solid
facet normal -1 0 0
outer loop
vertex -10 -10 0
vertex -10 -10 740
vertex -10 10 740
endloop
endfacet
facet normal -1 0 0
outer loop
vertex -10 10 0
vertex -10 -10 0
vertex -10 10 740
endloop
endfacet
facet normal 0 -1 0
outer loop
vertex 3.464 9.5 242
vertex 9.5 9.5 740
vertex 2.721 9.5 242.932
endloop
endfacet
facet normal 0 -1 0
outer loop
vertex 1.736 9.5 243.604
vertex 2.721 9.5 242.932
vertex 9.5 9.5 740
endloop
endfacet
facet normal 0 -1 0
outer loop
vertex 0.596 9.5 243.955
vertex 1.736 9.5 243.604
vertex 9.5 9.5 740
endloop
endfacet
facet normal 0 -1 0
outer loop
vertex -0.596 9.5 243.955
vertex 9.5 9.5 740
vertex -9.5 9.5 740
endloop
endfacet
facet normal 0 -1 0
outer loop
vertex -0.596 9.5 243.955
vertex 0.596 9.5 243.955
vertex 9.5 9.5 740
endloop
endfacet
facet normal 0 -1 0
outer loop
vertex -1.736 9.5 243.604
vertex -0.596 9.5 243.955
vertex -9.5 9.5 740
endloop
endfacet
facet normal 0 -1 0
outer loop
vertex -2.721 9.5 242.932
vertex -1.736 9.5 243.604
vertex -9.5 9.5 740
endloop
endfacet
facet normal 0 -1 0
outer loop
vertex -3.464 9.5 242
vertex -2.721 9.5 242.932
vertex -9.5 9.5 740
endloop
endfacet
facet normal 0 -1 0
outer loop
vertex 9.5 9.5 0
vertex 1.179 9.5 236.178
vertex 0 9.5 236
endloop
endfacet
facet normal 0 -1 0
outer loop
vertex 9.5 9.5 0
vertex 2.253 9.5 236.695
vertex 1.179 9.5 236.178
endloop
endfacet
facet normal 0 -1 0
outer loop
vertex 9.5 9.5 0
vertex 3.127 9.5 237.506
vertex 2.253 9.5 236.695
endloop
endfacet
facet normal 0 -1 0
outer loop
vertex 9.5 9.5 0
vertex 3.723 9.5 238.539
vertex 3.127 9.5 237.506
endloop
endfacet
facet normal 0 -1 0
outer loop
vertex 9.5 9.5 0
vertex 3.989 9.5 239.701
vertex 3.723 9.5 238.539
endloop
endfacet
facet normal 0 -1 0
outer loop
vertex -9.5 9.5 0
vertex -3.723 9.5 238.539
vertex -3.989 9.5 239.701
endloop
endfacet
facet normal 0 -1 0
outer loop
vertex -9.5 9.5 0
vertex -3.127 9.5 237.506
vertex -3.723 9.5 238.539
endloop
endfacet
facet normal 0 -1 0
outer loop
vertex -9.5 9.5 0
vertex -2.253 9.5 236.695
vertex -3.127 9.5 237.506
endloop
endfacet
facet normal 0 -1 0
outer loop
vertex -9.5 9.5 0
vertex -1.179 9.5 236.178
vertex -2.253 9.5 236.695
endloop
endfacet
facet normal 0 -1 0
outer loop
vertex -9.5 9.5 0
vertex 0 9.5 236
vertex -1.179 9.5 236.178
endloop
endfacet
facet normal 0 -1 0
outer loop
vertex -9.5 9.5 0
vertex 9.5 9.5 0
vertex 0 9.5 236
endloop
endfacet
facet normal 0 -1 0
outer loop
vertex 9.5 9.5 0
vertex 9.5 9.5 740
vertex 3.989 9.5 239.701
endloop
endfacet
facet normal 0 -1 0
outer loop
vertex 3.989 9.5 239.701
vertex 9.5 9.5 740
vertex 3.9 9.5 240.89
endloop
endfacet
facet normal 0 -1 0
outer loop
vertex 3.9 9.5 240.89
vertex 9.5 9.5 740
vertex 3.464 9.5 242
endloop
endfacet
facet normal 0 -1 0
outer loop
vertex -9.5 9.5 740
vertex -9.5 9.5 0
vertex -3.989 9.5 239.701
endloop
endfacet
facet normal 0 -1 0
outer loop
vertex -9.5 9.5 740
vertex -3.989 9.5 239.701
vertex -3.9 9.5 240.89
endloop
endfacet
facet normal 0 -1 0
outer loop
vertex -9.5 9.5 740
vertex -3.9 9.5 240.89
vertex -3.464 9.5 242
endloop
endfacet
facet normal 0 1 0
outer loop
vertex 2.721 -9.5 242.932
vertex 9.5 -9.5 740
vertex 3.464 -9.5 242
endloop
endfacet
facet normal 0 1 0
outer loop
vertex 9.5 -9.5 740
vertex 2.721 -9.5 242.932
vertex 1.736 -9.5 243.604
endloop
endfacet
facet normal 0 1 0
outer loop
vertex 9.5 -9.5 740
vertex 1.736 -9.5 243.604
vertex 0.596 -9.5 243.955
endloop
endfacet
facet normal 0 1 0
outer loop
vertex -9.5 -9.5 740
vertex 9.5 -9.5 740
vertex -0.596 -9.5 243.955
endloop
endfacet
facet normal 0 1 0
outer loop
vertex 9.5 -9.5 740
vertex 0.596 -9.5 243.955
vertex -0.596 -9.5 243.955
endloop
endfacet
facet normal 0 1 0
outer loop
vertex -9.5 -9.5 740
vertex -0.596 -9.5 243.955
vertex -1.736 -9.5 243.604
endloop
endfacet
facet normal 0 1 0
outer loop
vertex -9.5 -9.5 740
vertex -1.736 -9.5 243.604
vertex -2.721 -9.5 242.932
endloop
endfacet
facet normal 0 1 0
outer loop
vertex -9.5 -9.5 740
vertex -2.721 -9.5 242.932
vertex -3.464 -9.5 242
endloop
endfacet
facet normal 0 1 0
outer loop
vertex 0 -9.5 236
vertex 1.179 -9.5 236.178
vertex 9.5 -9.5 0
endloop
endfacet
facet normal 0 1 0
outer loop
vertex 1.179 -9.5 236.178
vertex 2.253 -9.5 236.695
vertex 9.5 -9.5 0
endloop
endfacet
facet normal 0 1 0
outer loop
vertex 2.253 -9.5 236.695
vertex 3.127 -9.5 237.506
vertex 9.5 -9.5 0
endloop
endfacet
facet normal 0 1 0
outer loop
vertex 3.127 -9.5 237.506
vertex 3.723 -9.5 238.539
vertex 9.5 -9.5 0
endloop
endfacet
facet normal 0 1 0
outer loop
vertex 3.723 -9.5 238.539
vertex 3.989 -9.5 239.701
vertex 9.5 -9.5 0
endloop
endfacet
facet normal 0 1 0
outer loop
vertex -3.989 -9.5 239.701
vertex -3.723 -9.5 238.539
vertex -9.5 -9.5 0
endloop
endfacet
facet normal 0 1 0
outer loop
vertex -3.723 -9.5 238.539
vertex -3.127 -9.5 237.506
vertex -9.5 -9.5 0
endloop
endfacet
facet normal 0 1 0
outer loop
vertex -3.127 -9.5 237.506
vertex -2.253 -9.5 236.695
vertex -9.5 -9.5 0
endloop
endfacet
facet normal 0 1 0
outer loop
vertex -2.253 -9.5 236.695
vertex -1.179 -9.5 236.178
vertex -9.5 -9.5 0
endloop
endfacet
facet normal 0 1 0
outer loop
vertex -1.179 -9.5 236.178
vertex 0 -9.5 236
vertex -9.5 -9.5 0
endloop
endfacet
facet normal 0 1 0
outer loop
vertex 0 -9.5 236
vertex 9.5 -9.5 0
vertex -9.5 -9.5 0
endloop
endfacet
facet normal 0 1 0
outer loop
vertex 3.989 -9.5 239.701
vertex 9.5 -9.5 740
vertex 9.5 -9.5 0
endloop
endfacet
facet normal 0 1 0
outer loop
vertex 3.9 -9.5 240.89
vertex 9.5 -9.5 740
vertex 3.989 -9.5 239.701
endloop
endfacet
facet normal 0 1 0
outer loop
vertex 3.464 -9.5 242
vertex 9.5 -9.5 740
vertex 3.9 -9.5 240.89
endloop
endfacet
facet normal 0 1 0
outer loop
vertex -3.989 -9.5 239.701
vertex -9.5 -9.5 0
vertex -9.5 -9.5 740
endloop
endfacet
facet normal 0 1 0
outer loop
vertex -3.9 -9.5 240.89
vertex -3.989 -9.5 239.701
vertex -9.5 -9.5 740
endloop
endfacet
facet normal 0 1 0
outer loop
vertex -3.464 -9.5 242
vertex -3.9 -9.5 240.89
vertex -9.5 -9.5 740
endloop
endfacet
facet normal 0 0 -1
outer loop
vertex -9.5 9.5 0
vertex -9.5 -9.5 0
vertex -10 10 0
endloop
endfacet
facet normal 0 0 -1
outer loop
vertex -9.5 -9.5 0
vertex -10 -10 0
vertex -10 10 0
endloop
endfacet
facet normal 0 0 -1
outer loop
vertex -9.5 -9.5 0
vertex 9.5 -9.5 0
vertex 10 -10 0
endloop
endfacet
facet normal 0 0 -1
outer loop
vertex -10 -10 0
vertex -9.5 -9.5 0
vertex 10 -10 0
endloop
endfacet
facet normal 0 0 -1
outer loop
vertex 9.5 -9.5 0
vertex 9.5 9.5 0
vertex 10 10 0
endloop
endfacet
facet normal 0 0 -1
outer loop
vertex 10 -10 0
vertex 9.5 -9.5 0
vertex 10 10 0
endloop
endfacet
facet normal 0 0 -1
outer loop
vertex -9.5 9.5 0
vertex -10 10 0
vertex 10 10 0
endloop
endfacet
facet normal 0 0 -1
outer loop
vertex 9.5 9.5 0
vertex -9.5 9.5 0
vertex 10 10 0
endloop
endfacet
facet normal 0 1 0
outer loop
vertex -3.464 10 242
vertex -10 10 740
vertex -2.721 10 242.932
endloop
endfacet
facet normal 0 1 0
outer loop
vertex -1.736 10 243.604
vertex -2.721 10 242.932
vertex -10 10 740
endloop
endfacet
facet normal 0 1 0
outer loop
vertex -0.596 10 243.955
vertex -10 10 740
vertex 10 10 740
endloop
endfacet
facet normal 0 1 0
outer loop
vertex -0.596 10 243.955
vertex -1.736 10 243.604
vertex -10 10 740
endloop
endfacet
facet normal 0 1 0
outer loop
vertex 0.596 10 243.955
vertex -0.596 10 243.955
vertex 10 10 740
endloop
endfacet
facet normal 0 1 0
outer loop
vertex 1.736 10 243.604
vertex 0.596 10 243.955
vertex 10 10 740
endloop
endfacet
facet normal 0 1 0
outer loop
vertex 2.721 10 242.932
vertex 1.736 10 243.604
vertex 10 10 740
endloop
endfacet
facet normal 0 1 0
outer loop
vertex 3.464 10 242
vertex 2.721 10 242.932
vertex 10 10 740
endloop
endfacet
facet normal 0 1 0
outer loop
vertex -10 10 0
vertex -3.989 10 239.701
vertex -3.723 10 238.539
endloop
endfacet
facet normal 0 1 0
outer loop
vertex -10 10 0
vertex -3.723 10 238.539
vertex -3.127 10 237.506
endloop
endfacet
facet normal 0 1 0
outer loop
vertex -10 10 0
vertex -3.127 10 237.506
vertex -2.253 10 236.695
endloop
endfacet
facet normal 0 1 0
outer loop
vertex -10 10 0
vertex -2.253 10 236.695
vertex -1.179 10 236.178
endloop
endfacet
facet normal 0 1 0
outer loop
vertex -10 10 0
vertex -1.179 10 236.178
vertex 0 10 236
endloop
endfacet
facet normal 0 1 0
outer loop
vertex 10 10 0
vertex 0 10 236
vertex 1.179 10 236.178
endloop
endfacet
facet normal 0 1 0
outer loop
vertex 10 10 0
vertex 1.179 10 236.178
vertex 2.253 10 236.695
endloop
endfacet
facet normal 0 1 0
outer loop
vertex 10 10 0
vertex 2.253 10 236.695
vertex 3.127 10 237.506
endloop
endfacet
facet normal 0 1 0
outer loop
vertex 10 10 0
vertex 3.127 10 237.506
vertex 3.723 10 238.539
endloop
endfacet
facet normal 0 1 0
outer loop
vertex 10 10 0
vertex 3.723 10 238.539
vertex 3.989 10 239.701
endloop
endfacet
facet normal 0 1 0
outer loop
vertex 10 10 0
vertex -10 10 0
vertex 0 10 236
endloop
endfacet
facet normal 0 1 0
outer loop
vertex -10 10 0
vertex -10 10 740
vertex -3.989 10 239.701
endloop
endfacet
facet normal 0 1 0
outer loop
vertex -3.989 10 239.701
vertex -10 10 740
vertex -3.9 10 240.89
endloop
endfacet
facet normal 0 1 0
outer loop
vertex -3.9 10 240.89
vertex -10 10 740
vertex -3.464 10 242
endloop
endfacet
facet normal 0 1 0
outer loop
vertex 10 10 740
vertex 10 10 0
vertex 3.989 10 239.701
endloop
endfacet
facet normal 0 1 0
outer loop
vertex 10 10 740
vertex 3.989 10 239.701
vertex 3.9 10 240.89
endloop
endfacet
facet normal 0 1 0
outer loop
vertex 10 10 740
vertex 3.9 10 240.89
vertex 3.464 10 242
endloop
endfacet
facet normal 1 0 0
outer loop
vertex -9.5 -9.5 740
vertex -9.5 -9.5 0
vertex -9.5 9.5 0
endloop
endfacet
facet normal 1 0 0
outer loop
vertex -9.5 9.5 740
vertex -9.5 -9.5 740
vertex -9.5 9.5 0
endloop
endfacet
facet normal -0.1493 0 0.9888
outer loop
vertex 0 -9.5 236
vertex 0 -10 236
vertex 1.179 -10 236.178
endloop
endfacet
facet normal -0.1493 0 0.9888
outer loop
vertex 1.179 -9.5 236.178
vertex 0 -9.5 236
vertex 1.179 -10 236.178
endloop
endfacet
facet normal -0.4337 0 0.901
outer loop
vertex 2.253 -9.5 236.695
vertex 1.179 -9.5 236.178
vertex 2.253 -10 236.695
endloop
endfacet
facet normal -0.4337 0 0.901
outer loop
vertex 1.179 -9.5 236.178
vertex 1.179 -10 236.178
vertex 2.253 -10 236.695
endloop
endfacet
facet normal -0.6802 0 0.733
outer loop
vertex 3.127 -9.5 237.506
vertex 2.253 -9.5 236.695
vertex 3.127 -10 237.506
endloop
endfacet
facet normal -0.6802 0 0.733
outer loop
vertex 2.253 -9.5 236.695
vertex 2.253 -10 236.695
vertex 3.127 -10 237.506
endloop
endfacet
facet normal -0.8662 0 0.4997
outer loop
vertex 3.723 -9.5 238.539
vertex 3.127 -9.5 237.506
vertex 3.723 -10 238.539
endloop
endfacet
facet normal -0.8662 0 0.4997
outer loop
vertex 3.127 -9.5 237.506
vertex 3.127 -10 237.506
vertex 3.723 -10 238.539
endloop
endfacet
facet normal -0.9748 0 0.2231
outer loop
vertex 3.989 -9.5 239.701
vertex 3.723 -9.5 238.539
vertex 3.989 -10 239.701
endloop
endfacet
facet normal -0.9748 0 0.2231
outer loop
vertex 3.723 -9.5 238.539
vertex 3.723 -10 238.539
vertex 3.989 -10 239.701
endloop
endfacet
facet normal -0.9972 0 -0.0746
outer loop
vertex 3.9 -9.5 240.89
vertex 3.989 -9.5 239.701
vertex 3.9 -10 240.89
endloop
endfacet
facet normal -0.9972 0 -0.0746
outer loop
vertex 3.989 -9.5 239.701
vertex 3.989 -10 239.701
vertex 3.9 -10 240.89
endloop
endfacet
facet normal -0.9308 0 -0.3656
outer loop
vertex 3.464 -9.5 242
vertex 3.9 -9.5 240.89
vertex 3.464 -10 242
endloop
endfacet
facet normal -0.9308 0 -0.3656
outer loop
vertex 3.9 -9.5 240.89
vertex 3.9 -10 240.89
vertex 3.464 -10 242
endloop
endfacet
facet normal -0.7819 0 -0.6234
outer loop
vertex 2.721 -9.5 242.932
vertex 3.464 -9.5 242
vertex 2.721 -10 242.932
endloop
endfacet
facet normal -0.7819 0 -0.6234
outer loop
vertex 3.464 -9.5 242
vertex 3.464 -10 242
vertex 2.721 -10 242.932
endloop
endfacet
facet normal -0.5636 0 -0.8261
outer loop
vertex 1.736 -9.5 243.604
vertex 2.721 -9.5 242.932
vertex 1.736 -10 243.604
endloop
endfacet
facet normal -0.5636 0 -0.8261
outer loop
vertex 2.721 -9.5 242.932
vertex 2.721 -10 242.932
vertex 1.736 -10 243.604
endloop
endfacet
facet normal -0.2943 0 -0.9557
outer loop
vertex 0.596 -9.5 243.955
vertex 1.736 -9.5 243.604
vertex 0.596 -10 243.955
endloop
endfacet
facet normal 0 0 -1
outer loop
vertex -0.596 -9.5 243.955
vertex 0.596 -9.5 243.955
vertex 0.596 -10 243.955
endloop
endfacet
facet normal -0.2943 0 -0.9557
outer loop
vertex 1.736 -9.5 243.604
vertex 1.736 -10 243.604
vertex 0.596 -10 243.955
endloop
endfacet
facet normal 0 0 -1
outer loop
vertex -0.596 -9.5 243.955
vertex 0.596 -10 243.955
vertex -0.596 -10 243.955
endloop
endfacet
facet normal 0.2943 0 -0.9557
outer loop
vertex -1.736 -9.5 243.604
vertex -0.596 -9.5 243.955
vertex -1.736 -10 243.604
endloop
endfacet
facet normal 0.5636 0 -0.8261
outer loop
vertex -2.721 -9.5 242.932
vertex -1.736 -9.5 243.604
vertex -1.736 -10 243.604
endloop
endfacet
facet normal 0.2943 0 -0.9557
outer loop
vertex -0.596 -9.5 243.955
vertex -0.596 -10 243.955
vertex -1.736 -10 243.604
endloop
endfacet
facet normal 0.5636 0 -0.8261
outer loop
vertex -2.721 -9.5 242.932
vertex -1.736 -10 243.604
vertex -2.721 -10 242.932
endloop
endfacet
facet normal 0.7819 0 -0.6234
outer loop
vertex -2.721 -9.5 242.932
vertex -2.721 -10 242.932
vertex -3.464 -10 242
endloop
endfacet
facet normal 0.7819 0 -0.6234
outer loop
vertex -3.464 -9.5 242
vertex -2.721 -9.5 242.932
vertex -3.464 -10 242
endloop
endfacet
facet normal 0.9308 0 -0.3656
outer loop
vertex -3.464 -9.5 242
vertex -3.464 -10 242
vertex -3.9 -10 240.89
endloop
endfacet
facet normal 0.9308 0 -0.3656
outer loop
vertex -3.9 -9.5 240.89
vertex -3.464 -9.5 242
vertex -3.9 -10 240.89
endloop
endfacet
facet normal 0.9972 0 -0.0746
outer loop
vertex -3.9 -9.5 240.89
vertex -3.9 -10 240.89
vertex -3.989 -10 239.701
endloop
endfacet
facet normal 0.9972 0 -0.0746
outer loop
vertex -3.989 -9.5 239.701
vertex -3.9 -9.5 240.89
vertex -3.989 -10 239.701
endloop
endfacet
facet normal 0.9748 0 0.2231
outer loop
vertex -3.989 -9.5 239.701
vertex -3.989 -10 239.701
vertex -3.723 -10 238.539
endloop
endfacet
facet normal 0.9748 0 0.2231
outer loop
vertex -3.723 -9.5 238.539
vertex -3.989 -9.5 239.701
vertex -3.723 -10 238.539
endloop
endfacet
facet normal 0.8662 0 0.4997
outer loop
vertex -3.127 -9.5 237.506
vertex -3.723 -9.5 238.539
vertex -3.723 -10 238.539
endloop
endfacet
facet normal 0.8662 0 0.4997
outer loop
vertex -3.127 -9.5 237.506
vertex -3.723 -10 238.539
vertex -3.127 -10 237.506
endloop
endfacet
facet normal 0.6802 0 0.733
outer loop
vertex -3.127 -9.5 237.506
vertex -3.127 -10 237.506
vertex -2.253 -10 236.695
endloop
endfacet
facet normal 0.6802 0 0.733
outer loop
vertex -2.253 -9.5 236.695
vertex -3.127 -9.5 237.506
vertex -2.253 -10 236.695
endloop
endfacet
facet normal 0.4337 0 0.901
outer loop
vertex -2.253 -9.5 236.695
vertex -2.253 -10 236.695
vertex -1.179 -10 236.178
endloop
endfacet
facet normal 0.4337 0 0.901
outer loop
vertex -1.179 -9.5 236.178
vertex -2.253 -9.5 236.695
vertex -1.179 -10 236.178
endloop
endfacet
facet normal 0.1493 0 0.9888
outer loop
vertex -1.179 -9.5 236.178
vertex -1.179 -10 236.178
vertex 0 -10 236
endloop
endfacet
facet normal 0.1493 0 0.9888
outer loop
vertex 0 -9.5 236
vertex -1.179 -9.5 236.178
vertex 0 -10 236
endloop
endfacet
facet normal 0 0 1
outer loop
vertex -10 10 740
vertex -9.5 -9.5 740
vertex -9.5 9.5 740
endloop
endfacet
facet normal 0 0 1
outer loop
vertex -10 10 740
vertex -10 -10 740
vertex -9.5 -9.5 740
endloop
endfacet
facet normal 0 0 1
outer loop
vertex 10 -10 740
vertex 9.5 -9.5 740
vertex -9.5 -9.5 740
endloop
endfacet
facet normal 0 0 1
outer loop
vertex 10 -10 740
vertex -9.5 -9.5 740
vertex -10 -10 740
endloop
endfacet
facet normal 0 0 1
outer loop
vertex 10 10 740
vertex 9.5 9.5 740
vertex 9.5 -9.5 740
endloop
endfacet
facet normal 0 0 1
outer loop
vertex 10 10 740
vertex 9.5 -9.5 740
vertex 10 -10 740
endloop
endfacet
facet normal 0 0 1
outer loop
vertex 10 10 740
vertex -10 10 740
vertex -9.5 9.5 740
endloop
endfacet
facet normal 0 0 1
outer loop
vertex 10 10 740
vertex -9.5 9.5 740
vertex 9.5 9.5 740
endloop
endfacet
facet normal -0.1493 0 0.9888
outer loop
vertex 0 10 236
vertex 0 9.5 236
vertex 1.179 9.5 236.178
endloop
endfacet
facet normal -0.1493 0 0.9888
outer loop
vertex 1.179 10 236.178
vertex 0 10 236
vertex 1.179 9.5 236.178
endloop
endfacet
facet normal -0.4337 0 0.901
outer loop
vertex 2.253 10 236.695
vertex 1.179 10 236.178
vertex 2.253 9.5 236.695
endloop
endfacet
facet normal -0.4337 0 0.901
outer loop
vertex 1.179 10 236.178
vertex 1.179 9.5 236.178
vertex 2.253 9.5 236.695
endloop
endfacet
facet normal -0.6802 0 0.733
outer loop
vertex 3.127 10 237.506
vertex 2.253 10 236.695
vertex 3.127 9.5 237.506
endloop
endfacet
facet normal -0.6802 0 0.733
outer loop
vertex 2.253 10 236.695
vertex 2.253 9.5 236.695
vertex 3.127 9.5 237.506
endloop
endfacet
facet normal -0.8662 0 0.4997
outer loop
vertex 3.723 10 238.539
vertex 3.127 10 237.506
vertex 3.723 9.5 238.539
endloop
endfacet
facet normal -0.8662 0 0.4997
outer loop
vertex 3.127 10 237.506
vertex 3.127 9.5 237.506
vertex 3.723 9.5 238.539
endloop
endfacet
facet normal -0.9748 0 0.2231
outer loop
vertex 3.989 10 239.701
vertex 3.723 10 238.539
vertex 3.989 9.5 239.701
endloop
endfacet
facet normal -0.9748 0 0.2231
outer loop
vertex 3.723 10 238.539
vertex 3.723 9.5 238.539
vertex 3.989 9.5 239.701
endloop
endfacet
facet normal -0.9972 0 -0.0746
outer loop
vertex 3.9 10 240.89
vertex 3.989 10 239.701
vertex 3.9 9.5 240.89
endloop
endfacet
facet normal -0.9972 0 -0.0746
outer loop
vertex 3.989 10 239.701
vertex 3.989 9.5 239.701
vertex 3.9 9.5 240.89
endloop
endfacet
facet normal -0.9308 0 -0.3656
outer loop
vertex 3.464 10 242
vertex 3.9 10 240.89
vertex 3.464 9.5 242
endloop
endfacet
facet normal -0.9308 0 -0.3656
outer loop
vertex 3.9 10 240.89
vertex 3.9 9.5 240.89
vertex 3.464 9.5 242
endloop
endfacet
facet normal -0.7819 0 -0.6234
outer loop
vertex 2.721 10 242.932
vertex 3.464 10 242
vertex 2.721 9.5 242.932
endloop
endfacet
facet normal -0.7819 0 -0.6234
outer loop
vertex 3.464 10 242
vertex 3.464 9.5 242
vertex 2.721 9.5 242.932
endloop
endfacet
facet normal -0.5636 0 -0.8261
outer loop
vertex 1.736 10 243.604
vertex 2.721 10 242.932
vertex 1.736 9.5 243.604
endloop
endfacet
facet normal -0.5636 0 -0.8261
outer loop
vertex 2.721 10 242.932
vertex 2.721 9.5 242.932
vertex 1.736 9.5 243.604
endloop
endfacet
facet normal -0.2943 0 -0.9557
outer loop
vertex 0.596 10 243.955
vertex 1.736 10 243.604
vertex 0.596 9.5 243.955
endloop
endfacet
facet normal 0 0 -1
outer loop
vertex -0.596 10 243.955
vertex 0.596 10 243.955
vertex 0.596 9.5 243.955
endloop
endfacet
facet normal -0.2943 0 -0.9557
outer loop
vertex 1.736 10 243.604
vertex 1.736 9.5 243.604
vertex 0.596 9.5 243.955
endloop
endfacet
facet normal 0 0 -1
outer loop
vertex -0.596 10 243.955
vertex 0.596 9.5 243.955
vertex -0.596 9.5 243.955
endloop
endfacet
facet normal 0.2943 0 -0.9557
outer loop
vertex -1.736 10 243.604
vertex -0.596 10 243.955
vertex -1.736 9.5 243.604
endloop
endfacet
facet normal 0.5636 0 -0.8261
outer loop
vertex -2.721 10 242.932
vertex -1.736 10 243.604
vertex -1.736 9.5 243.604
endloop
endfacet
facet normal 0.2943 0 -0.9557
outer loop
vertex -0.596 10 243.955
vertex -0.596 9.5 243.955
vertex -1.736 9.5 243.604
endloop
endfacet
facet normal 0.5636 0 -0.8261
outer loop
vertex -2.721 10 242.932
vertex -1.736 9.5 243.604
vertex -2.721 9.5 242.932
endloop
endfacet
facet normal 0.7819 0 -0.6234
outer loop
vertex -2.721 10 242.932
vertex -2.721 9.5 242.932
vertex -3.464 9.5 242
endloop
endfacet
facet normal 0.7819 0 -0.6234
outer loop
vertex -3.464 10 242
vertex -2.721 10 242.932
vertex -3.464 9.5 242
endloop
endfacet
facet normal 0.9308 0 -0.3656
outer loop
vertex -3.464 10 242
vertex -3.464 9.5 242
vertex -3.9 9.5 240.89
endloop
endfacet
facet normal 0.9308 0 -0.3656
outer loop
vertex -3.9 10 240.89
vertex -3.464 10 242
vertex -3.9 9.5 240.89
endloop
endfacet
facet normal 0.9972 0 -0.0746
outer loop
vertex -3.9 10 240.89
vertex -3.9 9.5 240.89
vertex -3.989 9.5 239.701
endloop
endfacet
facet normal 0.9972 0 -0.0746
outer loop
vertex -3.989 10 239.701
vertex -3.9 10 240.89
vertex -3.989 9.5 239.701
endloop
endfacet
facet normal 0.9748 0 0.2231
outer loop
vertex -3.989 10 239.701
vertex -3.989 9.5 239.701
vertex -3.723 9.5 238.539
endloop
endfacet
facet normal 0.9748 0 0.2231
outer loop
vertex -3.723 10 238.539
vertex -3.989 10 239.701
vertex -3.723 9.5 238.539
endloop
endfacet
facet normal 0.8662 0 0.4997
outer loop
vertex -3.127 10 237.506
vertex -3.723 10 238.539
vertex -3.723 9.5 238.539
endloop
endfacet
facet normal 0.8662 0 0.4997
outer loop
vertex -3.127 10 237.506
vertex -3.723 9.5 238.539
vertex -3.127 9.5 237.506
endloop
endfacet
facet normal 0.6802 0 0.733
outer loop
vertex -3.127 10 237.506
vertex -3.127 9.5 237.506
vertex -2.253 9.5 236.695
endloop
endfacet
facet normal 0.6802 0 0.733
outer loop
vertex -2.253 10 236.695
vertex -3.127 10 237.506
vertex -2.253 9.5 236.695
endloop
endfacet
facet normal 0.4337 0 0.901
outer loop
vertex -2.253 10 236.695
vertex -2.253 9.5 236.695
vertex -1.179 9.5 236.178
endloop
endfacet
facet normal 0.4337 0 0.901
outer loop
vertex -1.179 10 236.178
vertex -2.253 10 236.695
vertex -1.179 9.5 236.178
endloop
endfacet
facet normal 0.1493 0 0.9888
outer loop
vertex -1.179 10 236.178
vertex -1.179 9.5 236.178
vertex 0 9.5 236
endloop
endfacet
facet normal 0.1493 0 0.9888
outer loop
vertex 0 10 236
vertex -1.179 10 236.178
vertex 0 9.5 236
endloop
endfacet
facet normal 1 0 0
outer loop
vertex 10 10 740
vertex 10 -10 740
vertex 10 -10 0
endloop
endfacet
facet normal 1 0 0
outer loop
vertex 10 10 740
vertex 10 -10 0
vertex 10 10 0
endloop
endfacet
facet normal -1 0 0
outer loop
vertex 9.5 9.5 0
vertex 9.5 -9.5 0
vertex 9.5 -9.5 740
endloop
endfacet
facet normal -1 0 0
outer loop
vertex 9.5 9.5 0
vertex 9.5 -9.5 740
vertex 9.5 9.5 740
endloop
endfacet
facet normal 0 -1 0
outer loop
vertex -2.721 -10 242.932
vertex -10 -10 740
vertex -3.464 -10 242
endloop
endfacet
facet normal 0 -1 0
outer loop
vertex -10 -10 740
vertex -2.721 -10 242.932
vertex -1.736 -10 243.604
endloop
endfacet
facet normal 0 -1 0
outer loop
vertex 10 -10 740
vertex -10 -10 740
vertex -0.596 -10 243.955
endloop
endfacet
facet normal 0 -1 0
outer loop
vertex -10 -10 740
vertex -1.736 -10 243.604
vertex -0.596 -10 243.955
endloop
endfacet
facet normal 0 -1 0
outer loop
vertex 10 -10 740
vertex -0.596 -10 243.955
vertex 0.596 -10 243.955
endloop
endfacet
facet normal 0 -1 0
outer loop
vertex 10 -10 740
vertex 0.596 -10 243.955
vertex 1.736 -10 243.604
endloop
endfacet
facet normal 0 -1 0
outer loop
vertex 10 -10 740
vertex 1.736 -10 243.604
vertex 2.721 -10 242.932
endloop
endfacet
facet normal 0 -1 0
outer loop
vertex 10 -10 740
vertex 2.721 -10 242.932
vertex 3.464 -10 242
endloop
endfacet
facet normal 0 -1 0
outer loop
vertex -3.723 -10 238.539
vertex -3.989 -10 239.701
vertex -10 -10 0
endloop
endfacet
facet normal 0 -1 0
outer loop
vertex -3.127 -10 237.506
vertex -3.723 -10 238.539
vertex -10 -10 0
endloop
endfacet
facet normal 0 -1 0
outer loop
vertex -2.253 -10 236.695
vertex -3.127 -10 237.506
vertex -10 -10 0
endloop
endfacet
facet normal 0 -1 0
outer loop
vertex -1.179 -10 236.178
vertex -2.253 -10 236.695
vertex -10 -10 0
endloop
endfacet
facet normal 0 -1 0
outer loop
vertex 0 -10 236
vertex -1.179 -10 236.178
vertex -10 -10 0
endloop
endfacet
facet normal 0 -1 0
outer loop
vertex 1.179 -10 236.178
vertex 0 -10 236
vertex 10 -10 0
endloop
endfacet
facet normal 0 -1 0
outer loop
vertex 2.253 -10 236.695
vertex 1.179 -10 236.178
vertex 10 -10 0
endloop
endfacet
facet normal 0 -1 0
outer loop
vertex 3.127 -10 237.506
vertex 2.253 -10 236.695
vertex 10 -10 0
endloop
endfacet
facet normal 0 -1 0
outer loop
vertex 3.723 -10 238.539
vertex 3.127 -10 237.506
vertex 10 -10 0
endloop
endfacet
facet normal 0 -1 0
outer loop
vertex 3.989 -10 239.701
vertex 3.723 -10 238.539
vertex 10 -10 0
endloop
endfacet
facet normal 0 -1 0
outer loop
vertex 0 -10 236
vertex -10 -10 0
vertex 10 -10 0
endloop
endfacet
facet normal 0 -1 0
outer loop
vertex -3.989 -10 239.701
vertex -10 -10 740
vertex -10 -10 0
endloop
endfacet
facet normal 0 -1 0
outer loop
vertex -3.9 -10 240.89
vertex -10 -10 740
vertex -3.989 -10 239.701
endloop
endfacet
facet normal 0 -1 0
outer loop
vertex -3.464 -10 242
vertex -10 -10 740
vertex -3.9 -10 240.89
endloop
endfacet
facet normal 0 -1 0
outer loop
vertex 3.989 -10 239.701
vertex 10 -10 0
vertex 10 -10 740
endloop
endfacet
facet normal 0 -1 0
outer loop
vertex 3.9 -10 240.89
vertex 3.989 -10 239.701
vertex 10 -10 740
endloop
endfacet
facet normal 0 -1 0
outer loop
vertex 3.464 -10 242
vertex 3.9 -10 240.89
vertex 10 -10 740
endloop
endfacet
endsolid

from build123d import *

# Parameters (mm, degrees)
SKETCH2_W           = 20
SKETCH2_H           = 20
BOSS_EXTRUDE1_DEPTH = 740
SKETCH3_W           = 19
SKETCH3_H           = 19
CUT_EXTRUDE1_DEPTH  = 740
SKETCH5_R           = 4
CUT_EXTRUDE2_DEPTH  = 20


with BuildPart() as part:
    # Sketch2 → Boss-Extrude1 (new body)
    with BuildSketch(Plane.XY):
        Rectangle(SKETCH2_W, SKETCH2_H)
    extrude(amount=BOSS_EXTRUDE1_DEPTH)

    # Sketch3 → Cut-Extrude1 (cut)
    with BuildSketch(Plane(origin=(0, 0, 0), x_dir=(-1, 0, 0), z_dir=(0, 0, -1))):
        Rectangle(SKETCH3_W, SKETCH3_H)
    extrude(amount=-CUT_EXTRUDE1_DEPTH, mode=Mode.SUBTRACT)

    # Sketch5 → Cut-Extrude2 (cut)
    with BuildSketch(Plane.XZ.offset(10)):
        with Locations(Location((0, 240, 0), (0, 0, 270))):
            Circle(SKETCH5_R)
    extrude(amount=-CUT_EXTRUDE2_DEPTH, mode=Mode.SUBTRACT)


solid = part.part
